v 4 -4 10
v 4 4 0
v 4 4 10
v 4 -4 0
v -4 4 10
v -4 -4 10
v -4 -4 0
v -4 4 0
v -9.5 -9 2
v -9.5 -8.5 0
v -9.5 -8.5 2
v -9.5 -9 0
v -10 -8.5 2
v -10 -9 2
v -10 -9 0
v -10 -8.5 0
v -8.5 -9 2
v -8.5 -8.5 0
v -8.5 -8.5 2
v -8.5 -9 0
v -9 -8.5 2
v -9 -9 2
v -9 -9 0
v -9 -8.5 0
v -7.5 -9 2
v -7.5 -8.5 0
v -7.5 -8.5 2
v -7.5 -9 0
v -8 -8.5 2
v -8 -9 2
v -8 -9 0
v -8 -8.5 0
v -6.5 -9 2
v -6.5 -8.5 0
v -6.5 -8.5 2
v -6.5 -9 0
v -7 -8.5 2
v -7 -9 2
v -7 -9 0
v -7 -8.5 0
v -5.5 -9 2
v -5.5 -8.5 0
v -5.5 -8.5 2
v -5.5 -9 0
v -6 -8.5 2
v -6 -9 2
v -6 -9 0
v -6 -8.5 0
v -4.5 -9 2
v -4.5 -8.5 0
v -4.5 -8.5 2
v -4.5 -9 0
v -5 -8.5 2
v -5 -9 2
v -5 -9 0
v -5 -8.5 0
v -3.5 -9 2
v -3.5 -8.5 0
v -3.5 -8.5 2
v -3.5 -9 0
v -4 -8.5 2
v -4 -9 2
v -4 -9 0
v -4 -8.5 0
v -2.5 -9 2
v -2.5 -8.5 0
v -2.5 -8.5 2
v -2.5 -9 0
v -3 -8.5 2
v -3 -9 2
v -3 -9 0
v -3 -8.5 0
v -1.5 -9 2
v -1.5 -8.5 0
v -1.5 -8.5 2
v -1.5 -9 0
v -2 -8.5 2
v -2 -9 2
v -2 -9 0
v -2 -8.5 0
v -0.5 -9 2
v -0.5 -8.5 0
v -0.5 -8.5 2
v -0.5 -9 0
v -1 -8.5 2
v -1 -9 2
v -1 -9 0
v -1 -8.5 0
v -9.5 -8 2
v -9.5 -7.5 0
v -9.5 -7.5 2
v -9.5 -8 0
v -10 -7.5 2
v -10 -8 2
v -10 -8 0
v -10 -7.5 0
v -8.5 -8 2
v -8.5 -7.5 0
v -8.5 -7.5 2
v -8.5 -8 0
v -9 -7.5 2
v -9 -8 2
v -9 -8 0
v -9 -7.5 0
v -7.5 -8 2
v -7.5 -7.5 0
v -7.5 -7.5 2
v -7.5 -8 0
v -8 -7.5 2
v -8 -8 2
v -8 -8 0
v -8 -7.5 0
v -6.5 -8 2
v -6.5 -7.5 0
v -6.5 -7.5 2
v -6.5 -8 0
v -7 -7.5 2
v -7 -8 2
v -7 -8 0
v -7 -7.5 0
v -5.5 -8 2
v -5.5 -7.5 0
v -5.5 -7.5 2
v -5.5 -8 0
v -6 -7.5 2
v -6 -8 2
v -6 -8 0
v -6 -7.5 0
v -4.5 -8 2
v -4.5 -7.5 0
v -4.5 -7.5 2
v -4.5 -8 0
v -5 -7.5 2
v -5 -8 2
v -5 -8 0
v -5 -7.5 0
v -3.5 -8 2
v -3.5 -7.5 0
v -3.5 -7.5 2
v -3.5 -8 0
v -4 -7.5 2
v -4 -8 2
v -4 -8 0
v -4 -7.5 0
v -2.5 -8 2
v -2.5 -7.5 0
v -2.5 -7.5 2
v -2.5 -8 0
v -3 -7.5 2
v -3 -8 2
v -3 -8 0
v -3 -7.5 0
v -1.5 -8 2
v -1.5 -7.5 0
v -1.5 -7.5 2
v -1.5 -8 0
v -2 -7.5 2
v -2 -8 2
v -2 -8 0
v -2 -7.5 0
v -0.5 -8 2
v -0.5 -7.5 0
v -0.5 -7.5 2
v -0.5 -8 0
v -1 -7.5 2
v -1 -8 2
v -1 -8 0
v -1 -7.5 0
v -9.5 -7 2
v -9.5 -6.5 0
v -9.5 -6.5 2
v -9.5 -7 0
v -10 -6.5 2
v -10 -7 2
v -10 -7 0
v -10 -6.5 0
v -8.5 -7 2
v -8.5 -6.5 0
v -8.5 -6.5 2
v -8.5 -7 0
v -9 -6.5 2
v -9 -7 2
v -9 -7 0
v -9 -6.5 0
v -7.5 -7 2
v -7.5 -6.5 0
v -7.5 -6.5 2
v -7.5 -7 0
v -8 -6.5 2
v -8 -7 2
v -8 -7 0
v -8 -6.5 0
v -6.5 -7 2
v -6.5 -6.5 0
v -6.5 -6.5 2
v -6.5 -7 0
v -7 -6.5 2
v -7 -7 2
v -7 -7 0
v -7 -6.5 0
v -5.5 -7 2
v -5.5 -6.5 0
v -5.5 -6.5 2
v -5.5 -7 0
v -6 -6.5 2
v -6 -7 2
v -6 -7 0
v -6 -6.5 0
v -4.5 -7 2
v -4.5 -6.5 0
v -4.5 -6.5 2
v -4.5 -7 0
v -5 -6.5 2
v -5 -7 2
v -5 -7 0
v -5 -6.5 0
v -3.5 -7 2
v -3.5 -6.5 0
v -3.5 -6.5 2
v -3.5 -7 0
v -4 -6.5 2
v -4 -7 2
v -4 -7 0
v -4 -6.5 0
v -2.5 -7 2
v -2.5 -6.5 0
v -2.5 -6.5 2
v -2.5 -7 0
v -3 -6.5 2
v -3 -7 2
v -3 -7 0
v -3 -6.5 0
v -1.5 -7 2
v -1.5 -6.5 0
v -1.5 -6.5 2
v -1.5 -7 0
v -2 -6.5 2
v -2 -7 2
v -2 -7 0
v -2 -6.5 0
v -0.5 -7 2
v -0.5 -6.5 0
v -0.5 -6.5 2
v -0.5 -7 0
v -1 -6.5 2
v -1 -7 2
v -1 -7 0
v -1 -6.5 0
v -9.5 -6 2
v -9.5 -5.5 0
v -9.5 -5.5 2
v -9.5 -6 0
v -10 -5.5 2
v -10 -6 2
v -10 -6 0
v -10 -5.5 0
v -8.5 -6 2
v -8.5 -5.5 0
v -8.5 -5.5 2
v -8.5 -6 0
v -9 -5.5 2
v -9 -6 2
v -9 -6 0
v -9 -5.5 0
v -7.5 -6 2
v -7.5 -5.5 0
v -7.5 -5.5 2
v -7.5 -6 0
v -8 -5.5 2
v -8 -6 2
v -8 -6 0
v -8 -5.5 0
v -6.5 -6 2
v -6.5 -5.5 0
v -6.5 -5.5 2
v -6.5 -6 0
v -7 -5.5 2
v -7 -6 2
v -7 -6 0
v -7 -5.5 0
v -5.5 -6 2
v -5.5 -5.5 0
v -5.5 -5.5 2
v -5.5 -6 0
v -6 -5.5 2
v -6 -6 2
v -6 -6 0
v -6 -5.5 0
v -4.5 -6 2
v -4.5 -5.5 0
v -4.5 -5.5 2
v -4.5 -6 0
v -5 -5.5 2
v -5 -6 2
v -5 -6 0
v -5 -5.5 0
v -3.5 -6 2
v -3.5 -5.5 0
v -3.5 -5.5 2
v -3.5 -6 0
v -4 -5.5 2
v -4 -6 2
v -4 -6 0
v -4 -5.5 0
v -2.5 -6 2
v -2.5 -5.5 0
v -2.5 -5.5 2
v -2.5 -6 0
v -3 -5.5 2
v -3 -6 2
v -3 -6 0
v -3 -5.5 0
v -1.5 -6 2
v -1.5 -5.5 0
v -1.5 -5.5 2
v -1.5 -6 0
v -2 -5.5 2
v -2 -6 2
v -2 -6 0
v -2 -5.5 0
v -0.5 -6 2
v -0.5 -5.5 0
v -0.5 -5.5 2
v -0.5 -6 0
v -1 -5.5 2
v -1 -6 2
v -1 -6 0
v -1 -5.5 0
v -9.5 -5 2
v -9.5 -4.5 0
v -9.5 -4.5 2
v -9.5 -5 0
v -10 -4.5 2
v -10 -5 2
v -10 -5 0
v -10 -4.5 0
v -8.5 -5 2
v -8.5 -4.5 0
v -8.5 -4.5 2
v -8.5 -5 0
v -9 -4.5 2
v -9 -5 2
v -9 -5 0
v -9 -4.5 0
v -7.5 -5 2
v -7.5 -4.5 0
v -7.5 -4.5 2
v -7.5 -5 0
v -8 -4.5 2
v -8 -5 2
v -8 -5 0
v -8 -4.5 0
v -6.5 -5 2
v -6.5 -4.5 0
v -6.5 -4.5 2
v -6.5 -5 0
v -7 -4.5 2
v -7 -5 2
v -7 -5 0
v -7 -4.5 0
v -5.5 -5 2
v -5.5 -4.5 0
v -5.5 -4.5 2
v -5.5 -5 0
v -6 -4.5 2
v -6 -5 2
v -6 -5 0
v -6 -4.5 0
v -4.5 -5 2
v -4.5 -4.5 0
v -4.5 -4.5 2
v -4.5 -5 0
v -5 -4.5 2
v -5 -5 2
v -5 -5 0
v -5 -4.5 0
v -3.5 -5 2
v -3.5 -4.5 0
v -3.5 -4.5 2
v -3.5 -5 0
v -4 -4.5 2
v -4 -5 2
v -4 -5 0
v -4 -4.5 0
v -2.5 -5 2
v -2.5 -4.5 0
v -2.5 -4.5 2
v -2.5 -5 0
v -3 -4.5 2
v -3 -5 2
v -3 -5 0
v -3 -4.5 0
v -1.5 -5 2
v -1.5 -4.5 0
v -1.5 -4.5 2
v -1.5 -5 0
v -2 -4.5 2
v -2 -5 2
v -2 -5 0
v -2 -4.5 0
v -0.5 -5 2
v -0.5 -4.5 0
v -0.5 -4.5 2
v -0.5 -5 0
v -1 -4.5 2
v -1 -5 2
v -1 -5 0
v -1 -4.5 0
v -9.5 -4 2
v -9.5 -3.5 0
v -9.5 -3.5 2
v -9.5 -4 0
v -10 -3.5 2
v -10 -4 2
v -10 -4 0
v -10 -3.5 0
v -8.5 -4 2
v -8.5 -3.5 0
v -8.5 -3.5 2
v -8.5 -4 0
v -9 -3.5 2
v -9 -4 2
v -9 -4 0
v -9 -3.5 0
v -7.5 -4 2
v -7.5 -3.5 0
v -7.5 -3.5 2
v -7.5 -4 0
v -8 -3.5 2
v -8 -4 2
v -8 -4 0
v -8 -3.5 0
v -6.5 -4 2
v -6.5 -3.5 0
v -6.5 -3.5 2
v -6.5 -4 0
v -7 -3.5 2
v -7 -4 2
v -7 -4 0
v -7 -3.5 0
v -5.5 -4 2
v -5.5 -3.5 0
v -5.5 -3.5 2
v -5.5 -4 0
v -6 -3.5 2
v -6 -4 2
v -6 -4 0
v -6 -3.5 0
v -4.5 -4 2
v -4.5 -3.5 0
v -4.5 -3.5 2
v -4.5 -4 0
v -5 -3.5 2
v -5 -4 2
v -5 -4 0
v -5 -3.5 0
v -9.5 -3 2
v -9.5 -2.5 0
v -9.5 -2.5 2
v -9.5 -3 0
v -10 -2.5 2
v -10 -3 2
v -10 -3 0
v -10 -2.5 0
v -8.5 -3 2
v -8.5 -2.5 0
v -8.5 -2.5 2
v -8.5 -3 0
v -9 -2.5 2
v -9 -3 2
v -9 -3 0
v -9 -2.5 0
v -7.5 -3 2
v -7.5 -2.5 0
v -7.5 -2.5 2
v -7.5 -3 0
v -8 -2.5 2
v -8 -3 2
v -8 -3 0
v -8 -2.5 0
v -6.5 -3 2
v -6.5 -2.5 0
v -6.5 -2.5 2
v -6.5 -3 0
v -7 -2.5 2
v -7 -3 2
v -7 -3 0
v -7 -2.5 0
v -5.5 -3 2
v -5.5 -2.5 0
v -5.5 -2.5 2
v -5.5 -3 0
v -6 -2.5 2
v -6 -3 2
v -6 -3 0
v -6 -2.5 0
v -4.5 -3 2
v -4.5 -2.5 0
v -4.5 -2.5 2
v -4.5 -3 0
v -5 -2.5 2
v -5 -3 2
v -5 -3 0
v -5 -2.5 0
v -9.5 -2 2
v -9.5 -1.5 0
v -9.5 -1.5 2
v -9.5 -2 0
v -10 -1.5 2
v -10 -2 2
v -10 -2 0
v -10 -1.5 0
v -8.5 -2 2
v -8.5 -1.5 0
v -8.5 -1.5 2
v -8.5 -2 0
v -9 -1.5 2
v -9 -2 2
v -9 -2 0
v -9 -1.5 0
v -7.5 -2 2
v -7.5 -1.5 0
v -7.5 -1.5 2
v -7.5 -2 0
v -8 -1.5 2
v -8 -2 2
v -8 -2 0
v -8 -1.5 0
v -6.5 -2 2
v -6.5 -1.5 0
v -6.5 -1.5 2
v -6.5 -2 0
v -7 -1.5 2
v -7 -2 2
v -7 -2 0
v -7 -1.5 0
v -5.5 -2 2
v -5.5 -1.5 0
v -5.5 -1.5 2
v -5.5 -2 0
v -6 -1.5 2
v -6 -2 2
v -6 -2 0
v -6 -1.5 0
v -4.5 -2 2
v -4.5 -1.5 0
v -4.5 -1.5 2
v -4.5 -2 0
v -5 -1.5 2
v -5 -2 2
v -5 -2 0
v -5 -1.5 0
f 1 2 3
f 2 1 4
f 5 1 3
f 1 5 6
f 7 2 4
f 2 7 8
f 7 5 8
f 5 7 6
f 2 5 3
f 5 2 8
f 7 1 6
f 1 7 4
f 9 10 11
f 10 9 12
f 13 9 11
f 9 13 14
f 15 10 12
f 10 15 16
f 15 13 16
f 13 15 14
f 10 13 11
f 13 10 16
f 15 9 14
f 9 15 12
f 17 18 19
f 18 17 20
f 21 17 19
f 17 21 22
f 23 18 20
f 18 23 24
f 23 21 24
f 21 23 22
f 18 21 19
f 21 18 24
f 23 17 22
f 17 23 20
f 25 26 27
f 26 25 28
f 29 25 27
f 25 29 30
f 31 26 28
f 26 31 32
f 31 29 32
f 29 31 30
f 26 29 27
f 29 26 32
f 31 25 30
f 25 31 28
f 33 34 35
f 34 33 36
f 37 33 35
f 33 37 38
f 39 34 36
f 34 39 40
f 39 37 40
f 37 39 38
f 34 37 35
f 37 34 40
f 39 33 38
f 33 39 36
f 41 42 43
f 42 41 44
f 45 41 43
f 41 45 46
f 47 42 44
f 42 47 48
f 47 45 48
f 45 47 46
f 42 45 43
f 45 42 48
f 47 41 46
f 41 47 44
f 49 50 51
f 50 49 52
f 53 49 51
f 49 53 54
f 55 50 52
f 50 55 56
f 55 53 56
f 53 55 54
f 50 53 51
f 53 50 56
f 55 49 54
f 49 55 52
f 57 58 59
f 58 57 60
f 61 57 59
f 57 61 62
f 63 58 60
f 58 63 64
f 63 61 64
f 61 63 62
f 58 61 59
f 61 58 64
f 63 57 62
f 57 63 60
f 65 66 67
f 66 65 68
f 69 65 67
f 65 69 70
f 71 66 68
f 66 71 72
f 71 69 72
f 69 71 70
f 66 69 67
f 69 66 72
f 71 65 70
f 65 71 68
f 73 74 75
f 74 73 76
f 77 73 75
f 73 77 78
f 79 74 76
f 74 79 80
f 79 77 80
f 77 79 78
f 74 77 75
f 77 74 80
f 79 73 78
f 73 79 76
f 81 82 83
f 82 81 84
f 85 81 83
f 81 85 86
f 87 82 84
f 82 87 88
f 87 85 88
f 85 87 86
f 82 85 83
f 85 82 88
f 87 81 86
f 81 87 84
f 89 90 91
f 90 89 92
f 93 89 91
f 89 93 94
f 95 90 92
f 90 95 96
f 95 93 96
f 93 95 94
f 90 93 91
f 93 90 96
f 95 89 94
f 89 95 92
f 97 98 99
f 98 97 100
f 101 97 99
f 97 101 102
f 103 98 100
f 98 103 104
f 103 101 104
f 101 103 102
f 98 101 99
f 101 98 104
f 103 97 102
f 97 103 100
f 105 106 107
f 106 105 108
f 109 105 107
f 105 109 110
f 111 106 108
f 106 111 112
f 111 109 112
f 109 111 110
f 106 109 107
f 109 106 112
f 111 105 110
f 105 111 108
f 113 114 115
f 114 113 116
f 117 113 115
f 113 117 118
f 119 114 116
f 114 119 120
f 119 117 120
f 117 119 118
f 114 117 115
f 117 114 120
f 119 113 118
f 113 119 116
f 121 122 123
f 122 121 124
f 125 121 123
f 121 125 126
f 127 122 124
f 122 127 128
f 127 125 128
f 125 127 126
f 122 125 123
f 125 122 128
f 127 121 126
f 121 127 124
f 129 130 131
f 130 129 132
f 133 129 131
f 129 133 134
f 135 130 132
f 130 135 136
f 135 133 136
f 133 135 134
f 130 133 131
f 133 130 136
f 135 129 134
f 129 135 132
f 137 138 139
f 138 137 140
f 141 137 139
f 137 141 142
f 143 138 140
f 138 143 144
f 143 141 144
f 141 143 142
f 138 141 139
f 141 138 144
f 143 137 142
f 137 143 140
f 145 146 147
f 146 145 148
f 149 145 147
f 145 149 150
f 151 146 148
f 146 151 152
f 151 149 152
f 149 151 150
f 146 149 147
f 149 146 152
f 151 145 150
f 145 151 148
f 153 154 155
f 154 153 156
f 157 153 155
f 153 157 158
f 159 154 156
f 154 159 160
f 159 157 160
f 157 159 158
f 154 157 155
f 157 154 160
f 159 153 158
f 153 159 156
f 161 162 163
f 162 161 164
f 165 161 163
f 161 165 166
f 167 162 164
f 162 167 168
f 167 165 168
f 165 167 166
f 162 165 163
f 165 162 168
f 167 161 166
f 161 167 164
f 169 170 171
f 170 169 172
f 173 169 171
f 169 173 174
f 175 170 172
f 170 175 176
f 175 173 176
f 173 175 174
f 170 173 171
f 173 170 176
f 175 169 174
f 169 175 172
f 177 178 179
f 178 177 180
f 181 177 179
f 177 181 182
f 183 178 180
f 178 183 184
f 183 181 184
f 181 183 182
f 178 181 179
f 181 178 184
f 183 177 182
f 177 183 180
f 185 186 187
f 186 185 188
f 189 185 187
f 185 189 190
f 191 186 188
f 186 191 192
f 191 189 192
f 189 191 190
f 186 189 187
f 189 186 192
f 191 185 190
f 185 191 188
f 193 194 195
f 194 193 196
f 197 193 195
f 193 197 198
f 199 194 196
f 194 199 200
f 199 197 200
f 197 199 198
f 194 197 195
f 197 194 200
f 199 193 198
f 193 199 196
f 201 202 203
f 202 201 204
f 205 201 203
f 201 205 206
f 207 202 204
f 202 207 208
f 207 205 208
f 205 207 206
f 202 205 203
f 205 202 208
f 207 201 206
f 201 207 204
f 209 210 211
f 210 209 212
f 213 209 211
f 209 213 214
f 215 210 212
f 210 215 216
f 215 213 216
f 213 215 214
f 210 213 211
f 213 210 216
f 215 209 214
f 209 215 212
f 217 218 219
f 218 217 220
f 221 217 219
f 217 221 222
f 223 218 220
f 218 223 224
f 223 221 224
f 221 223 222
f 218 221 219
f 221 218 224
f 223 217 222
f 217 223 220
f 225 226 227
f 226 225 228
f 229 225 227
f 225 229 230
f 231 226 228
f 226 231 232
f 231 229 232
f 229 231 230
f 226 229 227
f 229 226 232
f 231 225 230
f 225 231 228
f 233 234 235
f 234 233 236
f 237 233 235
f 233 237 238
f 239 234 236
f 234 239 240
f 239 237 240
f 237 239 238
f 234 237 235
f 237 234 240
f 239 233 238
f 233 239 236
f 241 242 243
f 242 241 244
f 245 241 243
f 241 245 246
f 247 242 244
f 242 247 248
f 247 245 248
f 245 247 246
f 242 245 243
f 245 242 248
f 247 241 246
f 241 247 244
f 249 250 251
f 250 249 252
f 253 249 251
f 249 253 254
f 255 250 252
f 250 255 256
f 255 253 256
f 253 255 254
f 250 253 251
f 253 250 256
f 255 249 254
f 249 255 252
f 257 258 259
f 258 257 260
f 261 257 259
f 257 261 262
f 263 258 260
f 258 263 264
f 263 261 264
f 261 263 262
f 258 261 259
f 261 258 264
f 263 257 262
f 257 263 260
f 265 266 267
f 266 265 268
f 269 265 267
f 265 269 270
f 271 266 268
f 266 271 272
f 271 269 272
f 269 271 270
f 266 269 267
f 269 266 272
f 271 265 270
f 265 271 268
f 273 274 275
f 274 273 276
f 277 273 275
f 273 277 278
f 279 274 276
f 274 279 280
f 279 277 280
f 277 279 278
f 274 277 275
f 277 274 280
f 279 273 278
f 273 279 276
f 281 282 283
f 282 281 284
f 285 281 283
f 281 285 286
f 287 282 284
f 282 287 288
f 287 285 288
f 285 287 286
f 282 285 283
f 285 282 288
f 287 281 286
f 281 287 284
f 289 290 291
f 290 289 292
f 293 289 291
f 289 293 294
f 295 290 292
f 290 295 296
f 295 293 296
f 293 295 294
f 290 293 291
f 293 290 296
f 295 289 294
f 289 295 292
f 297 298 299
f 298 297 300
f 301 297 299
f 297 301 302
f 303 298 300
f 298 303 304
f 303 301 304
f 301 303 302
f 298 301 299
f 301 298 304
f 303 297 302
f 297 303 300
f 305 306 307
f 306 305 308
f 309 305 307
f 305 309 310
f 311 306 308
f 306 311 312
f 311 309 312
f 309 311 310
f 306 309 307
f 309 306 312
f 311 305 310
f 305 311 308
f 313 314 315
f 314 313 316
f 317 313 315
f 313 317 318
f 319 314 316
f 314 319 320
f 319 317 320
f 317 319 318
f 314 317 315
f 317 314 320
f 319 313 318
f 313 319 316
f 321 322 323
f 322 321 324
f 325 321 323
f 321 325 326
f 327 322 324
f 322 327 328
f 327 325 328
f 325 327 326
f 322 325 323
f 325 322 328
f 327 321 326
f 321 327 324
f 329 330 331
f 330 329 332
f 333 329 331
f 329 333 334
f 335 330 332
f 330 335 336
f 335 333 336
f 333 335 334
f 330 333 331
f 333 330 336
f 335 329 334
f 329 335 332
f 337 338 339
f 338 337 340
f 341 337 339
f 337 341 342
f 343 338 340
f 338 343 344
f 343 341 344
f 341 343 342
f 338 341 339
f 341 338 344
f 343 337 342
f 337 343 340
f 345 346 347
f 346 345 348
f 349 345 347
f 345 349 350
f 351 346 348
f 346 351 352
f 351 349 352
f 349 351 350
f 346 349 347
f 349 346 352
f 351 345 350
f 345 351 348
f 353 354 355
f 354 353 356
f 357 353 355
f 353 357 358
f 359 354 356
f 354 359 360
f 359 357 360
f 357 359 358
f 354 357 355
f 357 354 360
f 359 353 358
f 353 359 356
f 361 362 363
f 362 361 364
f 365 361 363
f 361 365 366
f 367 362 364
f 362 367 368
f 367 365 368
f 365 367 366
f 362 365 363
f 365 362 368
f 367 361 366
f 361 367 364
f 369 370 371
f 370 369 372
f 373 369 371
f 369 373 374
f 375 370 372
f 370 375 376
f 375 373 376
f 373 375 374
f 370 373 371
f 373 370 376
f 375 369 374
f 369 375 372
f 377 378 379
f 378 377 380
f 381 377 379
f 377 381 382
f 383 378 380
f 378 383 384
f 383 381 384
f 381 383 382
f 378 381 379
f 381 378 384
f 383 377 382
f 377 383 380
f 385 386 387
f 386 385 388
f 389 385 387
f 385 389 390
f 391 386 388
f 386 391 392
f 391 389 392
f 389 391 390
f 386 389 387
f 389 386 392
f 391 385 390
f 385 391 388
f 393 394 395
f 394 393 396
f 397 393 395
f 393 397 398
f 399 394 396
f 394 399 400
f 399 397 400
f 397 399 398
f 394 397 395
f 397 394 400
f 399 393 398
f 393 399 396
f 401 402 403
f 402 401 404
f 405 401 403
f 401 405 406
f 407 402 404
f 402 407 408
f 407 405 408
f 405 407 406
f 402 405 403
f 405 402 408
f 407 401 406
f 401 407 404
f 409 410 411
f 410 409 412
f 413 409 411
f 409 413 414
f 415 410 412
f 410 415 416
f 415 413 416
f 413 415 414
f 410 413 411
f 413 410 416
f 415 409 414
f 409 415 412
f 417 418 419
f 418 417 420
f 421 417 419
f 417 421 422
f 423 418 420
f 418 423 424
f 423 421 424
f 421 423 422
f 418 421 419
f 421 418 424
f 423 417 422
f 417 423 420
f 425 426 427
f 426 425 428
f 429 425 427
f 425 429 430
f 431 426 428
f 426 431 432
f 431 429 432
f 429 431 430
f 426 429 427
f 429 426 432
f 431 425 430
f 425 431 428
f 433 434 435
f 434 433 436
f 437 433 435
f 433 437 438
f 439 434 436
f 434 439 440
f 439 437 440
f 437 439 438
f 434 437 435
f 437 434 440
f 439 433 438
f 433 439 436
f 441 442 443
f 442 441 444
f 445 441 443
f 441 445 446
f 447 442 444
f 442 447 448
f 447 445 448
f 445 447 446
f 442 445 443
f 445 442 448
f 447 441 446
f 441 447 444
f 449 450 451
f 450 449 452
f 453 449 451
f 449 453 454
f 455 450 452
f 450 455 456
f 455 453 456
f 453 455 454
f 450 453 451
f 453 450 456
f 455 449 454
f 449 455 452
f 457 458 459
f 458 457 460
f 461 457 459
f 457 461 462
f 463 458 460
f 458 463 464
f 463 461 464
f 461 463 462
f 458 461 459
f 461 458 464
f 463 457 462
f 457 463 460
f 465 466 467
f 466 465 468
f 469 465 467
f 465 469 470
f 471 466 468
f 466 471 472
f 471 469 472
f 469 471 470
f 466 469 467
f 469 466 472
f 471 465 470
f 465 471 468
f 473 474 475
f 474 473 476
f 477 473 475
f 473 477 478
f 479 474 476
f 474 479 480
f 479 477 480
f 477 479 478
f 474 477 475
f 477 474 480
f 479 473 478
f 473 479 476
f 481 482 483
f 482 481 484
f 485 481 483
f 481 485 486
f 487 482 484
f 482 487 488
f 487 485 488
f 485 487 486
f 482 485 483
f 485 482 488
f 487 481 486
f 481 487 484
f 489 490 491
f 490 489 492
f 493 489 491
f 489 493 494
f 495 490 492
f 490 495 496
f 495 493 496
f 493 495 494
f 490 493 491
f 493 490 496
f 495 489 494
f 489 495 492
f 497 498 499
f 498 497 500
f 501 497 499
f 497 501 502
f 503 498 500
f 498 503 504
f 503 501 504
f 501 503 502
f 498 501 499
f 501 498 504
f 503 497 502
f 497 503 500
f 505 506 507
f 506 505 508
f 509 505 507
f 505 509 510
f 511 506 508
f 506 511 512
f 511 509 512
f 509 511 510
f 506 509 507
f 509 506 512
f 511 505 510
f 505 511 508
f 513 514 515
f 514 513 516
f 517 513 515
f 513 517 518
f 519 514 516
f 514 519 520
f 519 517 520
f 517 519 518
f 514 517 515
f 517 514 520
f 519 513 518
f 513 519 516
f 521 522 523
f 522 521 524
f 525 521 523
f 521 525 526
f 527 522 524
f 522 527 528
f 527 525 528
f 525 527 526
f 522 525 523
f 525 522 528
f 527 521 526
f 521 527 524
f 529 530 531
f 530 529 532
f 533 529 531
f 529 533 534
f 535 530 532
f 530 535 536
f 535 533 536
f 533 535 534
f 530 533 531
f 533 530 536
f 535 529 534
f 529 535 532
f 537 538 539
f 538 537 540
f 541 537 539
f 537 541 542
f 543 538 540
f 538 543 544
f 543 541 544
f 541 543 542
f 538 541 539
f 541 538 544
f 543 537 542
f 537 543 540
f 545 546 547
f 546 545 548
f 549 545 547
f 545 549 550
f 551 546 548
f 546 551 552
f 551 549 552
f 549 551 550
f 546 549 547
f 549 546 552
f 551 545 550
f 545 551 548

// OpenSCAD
translate([0, 0, 5]) color([0,1,0,0.9]) cube([8, 8, 10], center=true);
translate([-9.75, -8.75, 1]) color([1,0,0]) cube([0.5, 0.5, 2], center=true);
translate([-8.75, -8.75, 1]) color([1,0,0]) cube([0.5, 0.5, 2], center=true);
translate([-7.75, -8.75, 1]) color([1,0,0]) cube([0.5, 0.5, 2], center=true);
translate([-6.75, -8.75, 1]) color([1,0,0]) cube([0.5, 0.5, 2], center=true);
translate([-5.75, -8.75, 1]) color([1,0,0]) cube([0.5, 0.5, 2], center=true);
translate([-4.75, -8.75, 1]) color([1,0,0]) cube([0.5, 0.5, 2], center=true);
translate([-3.75, -8.75, 1]) color([1,0,0]) cube([0.5, 0.5, 2], center=true);
translate([-2.75, -8.75, 1]) color([1,0,0]) cube([0.5, 0.5, 2], center=true);
translate([-1.75, -8.75, 1]) color([1,0,0]) cube([0.5, 0.5, 2], center=true);
translate([-0.75, -8.75, 1]) color([1,0,0]) cube([0.5, 0.5, 2], center=true);
translate([-9.75, -7.75, 1]) color([1,0,0]) cube([0.5, 0.5, 2], center=true);
translate([-8.75, -7.75, 1]) color([1,0,0]) cube([0.5, 0.5, 2], center=true);
translate([-7.75, -7.75, 1]) color([1,0,0]) cube([0.5, 0.5, 2], center=true);
translate([-6.75, -7.75, 1]) color([1,0,0]) cube([0.5, 0.5, 2], center=true);
translate([-5.75, -7.75, 1]) color([1,0,0]) cube([0.5, 0.5, 2], center=true);
translate([-4.75, -7.75, 1]) color([1,0,0]) cube([0.5, 0.5, 2], center=true);
translate([-3.75, -7.75, 1]) color([1,0,0]) cube([0.5, 0.5, 2], center=true);
translate([-2.75, -7.75, 1]) color([1,0,0]) cube([0.5, 0.5, 2], center=true);
translate([-1.75, -7.75, 1]) color([1,0,0]) cube([0.5, 0.5, 2], center=true);
translate([-0.75, -7.75, 1]) color([1,0,0]) cube([0.5, 0.5, 2], center=true);
translate([-9.75, -6.75, 1]) color([1,0,0]) cube([0.5, 0.5, 2], center=true);
translate([-8.75, -6.75, 1]) color([1,0,0]) cube([0.5, 0.5, 2], center=true);
translate([-7.75, -6.75, 1]) color([1,0,0]) cube([0.5, 0.5, 2], center=true);
translate([-6.75, -6.75, 1]) color([1,0,0]) cube([0.5, 0.5, 2], center=true);
translate([-5.75, -6.75, 1]) color([1,0,0]) cube([0.5, 0.5, 2], center=true);
translate([-4.75, -6.75, 1]) color([1,0,0]) cube([0.5, 0.5, 2], center=true);
translate([-3.75, -6.75, 1]) color([1,0,0]) cube([0.5, 0.5, 2], center=true);
translate([-2.75, -6.75, 1]) color([1,0,0]) cube([0.5, 0.5, 2], center=true);
translate([-1.75, -6.75, 1]) color([1,0,0]) cube([0.5, 0.5, 2], center=true);
translate([-0.75, -6.75, 1]) color([1,0,0]) cube([0.5, 0.5, 2], center=true);
translate([-9.75, -5.75, 1]) color([1,0,0]) cube([0.5, 0.5, 2], center=true);
translate([-8.75, -5.75, 1]) color([1,0,0]) cube([0.5, 0.5, 2], center=true);
translate([-7.75, -5.75, 1]) color([1,0,0]) cube([0.5, 0.5, 2], center=true);
translate([-6.75, -5.75, 1]) color([1,0,0]) cube([0.5, 0.5, 2], center=true);
translate([-5.75, -5.75, 1]) color([1,0,0]) cube([0.5, 0.5, 2], center=true);
translate([-4.75, -5.75, 1]) color([1,0,0]) cube([0.5, 0.5, 2], center=true);
translate([-3.75, -5.75, 1]) color([1,0,0]) cube([0.5, 0.5, 2], center=true);
translate([-2.75, -5.75, 1]) color([1,0,0]) cube([0.5, 0.5, 2], center=true);
translate([-1.75, -5.75, 1]) color([1,0,0]) cube([0.5, 0.5, 2], center=true);
translate([-0.75, -5.75, 1]) color([1,0,0]) cube([0.5, 0.5, 2], center=true);
translate([-9.75, -4.75, 1]) color([1,0,0]) cube([0.5, 0.5, 2], center=true);
translate([-8.75, -4.75, 1]) color([1,0,0]) cube([0.5, 0.5, 2], center=true);
translate([-7.75, -4.75, 1]) color([1,0,0]) cube([0.5, 0.5, 2], center=true);
translate([-6.75, -4.75, 1]) color([1,0,0]) cube([0.5, 0.5, 2], center=true);
translate([-5.75, -4.75, 1]) color([1,0,0]) cube([0.5, 0.5, 2], center=true);
translate([-4.75, -4.75, 1]) color([1,0,0]) cube([0.5, 0.5, 2], center=true);
translate([-3.75, -4.75, 1]) color([1,0,0]) cube([0.5, 0.5, 2], center=true);
translate([-2.75, -4.75, 1]) color([1,0,0]) cube([0.5, 0.5, 2], center=true);
translate([-1.75, -4.75, 1]) color([1,0,0]) cube([0.5, 0.5, 2], center=true);
translate([-0.75, -4.75, 1]) color([1,0,0]) cube([0.5, 0.5, 2], center=true);
translate([-9.75, -3.75, 1]) color([1,0,0]) cube([0.5, 0.5, 2], center=true);
translate([-8.75, -3.75, 1]) color([1,0,0]) cube([0.5, 0.5, 2], center=true);
translate([-7.75, -3.75, 1]) color([1,0,0]) cube([0.5, 0.5, 2], center=true);
translate([-6.75, -3.75, 1]) color([1,0,0]) cube([0.5, 0.5, 2], center=true);
translate([-5.75, -3.75, 1]) color([1,0,0]) cube([0.5, 0.5, 2], center=true);
translate([-4.75, -3.75, 1]) color([1,0,0]) cube([0.5, 0.5, 2], center=true);
translate([-3.75, -3.75, 1]) color([1,0,0]) cube([0.5, 0.5, 2], center=true);
translate([-2.75, -3.75, 1]) color([1,0,0]) cube([0.5, 0.5, 2], center=true);
translate([-1.75, -3.75, 1]) color([1,0,0]) cube([0.5, 0.5, 2], center=true);
translate([-0.75, -3.75, 1]) color([1,0,0]) cube([0.5, 0.5, 2], center=true);
translate([-9.75, -2.75, 1]) color([1,0,0]) cube([0.5, 0.5, 2], center=true);
translate([-8.75, -2.75, 1]) color([1,0,0]) cube([0.5, 0.5, 2], center=true);
translate([-7.75, -2.75, 1]) color([1,0,0]) cube([0.5, 0.5, 2], center=true);
translate([-6.75, -2.75, 1]) color([1,0,0]) cube([0.5, 0.5, 2], center=true);
translate([-5.75, -2.75, 1]) color([1,0,0]) cube([0.5, 0.5, 2], center=true);
translate([-4.75, -2.75, 1]) color([1,0,0]) cube([0.5, 0.5, 2], center=true);
translate([-3.75, -2.75, 1]) color([1,0,0]) cube([0.5, 0.5, 2], center=true);
translate([-2.75, -2.75, 1]) color([1,0,0]) cube([0.5, 0.5, 2], center=true);
translate([-1.75, -2.75, 1]) color([1,0,0]) cube([0.5, 0.5, 2], center=true);
translate([-0.75, -2.75, 1]) color([1,0,0]) cube([0.5, 0.5, 2], center=true);
translate([-9.75, -1.75, 1]) color([1,0,0]) cube([0.5, 0.5, 2], center=true);
translate([-8.75, -1.75, 1]) color([1,0,0]) cube([0.5, 0.5, 2], center=true);
translate([-7.75, -1.75, 1]) color([1,0,0]) cube([0.5, 0.5, 2], center=true);
translate([-6.75, -1.75, 1]) color([1,0,0]) cube([0.5, 0.5, 2], center=true);
translate([-5.75, -1.75, 1]) color([1,0,0]) cube([0.5, 0.5, 2], center=true);
translate([-4.75, -1.75, 1]) color([1,0,0]) cube([0.5, 0.5, 2], center=true);
translate([-3.75, -1.75, 1]) color([1,0,0]) cube([0.5, 0.5, 2], center=true);
translate([-2.75, -1.75, 1]) color([1,0,0]) cube([0.5, 0.5, 2], center=true);
translate([-1.75, -1.75, 1]) color([1,0,0]) cube([0.5, 0.5, 2], center=true);
translate([-0.75, -1.75, 1]) color([1,0,0]) cube([0.5, 0.5, 2], center=true);
